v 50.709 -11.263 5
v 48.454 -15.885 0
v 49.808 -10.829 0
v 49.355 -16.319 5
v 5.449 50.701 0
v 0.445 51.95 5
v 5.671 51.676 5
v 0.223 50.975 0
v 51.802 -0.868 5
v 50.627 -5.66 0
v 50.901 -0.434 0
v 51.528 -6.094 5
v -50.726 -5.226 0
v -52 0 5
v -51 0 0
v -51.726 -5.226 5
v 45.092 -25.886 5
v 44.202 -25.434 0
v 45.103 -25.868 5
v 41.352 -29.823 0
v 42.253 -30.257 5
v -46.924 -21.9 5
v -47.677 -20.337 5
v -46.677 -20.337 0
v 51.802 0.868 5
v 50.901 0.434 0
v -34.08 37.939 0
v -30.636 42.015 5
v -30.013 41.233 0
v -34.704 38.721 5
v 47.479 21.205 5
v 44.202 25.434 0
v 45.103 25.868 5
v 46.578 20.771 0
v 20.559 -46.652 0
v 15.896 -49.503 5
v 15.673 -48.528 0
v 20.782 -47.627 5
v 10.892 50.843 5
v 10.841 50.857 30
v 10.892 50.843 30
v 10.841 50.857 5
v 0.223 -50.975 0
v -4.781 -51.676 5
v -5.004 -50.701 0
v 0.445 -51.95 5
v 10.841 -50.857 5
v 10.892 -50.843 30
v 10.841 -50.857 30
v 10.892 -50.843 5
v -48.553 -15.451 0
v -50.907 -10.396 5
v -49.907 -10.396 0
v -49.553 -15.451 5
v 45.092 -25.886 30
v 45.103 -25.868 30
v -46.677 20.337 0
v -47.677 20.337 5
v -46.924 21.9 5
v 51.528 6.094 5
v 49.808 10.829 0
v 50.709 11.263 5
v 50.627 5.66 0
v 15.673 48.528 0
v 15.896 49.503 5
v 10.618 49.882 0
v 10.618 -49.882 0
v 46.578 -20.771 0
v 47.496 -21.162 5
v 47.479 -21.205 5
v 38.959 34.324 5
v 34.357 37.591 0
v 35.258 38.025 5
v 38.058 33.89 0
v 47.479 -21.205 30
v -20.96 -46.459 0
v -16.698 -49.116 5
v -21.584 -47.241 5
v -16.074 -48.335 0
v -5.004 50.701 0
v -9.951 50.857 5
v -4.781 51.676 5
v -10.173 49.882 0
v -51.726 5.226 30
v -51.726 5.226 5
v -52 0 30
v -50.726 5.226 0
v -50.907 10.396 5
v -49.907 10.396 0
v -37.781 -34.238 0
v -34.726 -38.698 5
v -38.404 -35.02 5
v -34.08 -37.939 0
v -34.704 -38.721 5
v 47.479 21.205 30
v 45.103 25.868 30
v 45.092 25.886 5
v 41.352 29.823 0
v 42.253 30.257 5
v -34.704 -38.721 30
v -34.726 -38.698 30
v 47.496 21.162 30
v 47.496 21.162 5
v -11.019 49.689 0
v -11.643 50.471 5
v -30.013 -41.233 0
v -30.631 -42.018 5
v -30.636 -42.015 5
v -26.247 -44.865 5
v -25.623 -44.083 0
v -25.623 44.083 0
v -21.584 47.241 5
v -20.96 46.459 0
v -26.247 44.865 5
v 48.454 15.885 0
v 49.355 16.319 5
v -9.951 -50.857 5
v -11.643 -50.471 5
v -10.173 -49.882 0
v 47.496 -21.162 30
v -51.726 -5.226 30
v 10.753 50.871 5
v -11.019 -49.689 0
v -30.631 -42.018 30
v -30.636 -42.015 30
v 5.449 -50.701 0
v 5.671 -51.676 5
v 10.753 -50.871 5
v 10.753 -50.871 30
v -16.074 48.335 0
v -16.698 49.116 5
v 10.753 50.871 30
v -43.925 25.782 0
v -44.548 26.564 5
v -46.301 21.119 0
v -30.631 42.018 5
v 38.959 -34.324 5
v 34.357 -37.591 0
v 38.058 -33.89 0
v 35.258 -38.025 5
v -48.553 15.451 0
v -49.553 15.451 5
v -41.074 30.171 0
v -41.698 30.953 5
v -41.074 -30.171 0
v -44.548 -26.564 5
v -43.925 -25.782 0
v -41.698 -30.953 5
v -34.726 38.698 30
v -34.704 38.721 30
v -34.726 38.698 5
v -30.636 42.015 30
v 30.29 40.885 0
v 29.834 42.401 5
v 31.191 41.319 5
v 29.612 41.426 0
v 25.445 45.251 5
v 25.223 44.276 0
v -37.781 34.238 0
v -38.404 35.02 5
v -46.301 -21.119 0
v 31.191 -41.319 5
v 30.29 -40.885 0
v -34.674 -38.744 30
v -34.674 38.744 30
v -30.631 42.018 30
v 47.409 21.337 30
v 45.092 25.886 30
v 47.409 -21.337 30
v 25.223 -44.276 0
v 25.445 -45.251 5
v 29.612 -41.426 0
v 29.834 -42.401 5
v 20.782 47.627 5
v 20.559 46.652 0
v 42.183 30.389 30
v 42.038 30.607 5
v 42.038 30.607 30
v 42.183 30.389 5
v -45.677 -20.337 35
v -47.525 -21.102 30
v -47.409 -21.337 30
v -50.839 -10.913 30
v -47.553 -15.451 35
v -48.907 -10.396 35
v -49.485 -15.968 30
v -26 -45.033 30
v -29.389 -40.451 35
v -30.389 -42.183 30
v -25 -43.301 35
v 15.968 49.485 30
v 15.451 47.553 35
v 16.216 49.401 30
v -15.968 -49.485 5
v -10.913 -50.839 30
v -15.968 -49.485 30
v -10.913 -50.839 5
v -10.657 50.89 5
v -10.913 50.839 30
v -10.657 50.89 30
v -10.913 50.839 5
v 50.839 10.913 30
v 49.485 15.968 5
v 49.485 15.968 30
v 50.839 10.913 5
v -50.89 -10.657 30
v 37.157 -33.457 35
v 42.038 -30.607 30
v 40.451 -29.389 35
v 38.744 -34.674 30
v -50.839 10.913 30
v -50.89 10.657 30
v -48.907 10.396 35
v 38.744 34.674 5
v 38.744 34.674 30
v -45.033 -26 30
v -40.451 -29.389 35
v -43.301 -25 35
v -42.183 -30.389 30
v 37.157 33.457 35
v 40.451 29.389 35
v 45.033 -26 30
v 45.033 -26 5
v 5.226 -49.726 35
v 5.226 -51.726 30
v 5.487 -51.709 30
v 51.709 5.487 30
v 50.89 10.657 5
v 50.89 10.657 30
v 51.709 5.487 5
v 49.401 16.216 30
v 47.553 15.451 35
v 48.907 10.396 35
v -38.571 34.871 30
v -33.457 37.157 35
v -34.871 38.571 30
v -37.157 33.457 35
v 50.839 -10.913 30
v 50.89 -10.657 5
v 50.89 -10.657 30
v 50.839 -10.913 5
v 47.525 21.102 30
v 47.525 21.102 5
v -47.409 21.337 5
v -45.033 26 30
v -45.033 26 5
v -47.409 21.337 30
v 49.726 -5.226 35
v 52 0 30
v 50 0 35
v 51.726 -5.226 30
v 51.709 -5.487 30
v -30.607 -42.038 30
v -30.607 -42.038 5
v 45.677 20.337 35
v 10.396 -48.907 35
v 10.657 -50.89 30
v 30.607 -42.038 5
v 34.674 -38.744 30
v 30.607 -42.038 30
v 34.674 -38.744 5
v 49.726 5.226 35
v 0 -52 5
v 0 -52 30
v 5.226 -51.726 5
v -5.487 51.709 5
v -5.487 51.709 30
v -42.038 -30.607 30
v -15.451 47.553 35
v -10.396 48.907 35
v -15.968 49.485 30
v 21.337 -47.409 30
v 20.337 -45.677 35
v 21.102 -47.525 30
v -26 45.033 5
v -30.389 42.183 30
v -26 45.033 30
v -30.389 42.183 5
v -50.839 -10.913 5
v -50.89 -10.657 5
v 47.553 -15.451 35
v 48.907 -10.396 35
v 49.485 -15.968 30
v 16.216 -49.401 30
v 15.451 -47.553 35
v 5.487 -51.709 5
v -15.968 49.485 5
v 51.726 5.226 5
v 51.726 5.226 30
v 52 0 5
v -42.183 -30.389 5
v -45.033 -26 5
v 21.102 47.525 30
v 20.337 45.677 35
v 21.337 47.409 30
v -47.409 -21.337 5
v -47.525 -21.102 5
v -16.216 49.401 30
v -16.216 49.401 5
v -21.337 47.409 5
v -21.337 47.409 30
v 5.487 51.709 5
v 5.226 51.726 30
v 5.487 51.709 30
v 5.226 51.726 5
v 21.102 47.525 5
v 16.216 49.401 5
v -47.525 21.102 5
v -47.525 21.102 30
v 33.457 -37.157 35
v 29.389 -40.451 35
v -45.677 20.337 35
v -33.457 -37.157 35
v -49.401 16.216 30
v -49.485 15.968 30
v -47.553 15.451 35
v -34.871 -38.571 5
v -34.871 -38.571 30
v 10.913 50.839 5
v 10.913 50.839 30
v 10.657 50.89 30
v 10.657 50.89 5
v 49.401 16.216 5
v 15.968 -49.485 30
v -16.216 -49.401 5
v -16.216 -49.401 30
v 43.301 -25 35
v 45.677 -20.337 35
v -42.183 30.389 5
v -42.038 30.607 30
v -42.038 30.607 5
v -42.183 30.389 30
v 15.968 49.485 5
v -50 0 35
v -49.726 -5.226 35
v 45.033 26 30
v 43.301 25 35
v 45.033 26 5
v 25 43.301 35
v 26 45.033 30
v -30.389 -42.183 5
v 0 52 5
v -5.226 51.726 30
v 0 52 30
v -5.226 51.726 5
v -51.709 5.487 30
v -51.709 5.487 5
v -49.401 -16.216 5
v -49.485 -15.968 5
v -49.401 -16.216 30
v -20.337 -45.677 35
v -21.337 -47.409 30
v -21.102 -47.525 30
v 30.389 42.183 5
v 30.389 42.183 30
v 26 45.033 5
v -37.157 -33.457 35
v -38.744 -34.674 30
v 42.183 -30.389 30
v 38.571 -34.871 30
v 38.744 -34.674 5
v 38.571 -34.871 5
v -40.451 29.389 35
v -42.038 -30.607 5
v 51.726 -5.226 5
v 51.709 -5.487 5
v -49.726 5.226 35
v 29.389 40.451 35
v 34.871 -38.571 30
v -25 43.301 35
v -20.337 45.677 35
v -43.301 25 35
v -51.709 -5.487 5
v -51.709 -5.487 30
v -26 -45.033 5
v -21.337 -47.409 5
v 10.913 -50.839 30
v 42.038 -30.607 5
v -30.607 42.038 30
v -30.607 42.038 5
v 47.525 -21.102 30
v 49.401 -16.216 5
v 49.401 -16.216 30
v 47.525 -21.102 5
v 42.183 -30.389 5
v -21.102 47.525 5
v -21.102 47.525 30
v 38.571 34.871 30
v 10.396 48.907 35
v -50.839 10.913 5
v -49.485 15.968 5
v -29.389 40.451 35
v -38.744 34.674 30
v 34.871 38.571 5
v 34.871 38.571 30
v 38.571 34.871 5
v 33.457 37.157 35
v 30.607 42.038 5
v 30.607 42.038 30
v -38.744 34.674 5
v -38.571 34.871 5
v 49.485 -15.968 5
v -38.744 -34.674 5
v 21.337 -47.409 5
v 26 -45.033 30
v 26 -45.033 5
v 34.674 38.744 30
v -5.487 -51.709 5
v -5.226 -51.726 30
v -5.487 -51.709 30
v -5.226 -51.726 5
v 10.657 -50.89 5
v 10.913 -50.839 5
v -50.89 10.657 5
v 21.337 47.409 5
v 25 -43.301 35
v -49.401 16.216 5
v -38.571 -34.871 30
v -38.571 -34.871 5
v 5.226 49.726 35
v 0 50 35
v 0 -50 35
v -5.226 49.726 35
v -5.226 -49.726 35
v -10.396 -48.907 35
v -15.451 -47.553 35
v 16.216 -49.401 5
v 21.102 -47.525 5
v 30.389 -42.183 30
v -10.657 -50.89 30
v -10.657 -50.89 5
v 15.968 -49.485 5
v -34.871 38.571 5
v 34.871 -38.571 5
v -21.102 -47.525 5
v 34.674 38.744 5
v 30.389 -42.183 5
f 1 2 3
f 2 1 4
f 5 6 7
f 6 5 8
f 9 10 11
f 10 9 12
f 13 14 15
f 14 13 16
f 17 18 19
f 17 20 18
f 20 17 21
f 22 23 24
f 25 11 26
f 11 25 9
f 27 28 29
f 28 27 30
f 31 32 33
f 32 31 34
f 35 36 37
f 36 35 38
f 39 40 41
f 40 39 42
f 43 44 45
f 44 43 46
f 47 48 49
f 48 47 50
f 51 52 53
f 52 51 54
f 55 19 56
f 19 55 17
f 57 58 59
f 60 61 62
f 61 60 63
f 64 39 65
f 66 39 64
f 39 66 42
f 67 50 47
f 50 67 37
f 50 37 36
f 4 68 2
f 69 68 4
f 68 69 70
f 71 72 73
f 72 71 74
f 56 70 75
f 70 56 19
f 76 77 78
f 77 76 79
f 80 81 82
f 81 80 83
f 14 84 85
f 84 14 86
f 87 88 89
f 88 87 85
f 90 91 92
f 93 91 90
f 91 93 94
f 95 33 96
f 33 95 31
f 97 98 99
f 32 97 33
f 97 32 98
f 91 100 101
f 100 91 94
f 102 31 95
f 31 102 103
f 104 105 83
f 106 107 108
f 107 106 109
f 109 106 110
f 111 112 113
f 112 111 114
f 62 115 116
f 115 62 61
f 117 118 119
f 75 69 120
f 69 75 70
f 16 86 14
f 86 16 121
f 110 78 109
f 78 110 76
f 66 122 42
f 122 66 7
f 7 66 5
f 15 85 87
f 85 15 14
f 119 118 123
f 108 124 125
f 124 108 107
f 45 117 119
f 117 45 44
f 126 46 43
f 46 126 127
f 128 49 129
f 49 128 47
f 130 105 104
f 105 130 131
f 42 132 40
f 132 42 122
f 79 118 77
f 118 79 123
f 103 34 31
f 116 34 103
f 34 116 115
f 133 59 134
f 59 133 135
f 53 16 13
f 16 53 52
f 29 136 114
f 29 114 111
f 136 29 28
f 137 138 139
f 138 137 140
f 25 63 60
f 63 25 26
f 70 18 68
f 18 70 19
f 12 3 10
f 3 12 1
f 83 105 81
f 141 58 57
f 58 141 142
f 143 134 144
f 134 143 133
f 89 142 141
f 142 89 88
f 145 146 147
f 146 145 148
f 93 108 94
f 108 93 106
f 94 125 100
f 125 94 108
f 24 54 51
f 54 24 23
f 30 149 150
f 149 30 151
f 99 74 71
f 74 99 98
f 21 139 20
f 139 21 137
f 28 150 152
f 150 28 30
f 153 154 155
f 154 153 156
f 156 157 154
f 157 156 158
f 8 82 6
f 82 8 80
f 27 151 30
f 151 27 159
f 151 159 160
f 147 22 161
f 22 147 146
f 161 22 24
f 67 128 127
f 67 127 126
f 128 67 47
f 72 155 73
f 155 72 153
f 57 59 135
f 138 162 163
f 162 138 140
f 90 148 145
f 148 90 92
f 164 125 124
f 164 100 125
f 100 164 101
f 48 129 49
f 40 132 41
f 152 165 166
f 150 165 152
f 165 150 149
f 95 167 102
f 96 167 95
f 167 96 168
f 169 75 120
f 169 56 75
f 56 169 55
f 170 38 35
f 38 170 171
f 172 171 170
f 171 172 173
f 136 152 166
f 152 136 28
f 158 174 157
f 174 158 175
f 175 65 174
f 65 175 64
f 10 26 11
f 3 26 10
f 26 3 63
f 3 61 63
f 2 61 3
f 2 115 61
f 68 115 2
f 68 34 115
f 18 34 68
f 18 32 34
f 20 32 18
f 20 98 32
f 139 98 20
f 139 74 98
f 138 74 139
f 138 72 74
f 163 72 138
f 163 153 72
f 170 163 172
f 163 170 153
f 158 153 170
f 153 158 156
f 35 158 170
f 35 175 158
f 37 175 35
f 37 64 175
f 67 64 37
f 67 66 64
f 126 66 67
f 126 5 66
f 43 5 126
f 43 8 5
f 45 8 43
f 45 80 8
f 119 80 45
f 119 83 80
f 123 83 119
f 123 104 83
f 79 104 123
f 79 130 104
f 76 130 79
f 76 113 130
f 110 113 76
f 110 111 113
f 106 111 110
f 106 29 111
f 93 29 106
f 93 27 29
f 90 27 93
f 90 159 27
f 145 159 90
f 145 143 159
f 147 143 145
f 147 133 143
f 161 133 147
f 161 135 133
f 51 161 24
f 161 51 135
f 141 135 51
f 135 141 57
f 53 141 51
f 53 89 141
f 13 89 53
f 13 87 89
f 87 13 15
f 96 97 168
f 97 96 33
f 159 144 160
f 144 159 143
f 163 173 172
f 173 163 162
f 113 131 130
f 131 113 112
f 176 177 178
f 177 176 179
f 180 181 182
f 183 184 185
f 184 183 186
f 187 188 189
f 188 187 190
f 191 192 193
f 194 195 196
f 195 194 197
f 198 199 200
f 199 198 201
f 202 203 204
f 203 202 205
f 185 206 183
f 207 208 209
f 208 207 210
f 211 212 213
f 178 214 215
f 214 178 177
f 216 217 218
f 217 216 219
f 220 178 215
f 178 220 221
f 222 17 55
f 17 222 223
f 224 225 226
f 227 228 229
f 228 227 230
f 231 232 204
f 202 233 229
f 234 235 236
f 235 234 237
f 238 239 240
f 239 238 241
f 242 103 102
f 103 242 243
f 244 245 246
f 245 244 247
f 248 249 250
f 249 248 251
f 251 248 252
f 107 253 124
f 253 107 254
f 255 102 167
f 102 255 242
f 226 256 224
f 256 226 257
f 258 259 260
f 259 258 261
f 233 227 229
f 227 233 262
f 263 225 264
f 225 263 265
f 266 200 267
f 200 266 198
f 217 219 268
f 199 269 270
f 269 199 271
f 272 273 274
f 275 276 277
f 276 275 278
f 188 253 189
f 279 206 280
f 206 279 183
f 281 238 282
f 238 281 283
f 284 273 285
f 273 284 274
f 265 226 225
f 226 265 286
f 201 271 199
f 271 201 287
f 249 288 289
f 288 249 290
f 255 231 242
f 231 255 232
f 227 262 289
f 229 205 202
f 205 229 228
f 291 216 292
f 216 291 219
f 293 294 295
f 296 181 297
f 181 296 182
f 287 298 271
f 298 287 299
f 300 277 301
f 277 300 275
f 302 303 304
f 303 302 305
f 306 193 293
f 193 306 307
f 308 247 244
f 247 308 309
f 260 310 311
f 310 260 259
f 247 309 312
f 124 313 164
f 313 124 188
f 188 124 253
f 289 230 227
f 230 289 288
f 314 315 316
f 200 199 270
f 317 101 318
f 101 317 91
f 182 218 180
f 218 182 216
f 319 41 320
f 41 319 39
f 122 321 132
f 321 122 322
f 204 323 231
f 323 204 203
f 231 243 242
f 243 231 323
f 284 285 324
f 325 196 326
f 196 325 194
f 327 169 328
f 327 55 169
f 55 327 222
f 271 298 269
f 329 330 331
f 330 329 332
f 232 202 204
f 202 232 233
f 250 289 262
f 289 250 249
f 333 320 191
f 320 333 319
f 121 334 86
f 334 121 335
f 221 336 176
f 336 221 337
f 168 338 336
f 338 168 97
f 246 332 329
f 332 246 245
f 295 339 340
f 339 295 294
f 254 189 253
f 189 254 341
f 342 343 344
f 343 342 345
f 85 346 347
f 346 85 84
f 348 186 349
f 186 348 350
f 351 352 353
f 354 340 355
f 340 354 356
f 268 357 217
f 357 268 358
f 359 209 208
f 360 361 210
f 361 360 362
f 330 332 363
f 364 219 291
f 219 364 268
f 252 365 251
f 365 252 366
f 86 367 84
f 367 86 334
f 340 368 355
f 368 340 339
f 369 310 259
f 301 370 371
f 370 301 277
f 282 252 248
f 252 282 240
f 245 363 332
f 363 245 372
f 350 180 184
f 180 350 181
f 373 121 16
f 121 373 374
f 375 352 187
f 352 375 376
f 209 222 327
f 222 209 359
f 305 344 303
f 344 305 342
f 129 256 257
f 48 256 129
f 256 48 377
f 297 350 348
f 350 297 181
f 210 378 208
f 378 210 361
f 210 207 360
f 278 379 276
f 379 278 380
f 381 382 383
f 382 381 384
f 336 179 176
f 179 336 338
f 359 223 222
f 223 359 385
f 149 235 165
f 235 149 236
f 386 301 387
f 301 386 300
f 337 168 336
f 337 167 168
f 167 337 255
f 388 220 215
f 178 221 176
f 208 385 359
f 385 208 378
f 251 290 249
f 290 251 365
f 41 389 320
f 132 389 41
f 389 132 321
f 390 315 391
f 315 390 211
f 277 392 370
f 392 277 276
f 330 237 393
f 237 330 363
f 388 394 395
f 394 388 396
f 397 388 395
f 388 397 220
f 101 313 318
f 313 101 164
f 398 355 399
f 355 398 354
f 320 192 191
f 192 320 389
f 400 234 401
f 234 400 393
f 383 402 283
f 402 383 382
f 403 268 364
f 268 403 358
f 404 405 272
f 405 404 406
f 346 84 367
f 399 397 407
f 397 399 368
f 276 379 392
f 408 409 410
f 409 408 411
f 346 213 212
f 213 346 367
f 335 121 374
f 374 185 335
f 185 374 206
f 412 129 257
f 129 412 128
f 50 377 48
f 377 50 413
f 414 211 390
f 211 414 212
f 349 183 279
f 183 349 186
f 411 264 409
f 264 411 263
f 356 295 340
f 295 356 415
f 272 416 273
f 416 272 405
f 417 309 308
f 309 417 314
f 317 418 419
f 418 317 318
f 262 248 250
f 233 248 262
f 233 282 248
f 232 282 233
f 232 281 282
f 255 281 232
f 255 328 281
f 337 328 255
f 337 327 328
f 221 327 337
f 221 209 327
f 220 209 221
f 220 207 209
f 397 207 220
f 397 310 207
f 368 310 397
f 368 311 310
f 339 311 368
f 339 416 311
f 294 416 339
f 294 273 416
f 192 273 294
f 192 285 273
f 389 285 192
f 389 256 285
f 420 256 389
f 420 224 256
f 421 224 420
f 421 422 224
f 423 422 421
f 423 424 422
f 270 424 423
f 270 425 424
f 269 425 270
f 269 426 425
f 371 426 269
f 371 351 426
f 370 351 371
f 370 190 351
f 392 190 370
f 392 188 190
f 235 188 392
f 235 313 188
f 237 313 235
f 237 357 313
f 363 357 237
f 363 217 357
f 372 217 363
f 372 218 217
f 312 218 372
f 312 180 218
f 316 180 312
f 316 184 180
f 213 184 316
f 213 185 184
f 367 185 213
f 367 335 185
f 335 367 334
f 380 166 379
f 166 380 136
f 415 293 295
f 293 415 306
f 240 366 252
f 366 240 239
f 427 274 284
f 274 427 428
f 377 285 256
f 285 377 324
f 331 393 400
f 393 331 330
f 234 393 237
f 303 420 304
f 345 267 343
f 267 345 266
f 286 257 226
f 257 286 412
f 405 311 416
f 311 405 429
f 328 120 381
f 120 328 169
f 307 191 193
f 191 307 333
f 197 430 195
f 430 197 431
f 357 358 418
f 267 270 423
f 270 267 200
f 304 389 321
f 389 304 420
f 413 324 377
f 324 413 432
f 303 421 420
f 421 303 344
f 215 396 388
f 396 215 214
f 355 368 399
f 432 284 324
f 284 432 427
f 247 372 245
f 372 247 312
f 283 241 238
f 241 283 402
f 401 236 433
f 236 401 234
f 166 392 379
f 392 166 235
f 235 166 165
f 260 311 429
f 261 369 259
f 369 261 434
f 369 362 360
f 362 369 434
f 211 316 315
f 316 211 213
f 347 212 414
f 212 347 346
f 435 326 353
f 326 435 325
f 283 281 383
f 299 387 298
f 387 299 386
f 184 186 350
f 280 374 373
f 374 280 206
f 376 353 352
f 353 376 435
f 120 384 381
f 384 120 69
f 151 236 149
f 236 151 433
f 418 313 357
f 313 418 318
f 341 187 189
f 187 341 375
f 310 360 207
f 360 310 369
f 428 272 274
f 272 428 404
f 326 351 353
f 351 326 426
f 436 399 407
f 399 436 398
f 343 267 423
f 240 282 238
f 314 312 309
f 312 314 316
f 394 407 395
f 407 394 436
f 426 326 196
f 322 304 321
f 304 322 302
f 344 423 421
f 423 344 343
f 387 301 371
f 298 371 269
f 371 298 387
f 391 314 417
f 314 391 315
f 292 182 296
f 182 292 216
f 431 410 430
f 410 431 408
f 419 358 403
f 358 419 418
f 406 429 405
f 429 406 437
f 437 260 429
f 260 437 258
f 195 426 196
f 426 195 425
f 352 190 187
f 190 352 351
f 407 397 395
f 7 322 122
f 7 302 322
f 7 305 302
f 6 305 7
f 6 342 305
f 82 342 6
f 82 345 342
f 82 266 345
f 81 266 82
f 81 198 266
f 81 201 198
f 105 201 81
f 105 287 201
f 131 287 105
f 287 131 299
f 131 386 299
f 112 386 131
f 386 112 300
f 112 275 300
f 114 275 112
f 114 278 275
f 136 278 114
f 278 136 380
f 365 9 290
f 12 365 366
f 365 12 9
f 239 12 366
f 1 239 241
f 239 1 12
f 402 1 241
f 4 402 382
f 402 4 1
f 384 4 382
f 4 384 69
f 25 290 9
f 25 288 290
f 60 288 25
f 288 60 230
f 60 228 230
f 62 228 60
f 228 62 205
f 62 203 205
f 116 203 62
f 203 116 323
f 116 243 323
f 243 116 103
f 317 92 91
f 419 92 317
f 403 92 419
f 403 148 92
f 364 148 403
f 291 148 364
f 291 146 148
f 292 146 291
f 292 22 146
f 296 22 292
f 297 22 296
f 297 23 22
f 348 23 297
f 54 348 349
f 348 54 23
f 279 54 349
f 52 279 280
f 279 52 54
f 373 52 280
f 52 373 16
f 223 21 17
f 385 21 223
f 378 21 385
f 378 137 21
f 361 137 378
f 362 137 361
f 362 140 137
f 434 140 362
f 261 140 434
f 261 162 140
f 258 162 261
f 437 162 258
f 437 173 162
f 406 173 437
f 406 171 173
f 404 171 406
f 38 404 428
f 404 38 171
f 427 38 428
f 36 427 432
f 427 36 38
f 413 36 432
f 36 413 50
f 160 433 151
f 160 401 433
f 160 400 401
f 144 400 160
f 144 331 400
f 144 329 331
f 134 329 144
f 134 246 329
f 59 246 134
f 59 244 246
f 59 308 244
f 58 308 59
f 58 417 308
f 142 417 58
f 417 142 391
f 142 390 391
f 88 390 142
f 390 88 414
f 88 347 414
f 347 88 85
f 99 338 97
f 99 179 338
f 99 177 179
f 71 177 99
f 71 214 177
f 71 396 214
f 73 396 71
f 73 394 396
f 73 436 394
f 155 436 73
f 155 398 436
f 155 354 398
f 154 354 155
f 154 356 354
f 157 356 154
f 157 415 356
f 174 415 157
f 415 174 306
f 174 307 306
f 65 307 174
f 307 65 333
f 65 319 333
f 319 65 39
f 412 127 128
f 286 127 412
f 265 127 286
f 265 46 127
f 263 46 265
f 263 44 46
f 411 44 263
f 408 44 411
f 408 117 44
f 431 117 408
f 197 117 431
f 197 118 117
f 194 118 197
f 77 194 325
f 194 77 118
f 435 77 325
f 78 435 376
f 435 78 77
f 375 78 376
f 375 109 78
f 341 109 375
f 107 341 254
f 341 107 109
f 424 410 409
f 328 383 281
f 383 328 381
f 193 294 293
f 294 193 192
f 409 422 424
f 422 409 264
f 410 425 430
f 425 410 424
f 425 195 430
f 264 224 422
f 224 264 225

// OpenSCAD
sled_thickness = 25; // Thickness of the raised edge where the holes are
sled_diameter = 100;

hole_diameter = 6; // bolt hole diameter
bolthead_d = 12; // bolt head countersink diameter
bolthead_h = 2; // bolt head height (for countersink depth)
radius_to_hole = 50; // Distance from center to the center of the mounting holes
downangle = 32; // Angle in degrees cameras face downward
cord_hole_length = 20;
cord_hole_width = 10;
cord_hole_offset = 20;

// Alignment indent in edge
// picam base width is 13.5
picam_base_width = 14.1375;
// picam base thickness is 11.5, optimum size is
// 12.1375, but we want to give a little space for
// bad drilling and it's better to index against
// the side
picam_base_thickness = 12.2;
indent_depth = 2;
offset_of_hole = 0; // If the mounting bolt hole isn't centered you can adjust it
taper1 = 2;
taper2 = 5;
module edge_taper(){
    cylinder(h=5,r1=taper1, r2=0, $fn=48);
    rotate([0,180,0]){cylinder(h=5,r1=taper1);}
}

minkowski(){
    cylinder(h=sled_thickness,r=sled_diameter/2, $fn=60);
    translate([0,0,5]){
        edge_taper();
    }
}
